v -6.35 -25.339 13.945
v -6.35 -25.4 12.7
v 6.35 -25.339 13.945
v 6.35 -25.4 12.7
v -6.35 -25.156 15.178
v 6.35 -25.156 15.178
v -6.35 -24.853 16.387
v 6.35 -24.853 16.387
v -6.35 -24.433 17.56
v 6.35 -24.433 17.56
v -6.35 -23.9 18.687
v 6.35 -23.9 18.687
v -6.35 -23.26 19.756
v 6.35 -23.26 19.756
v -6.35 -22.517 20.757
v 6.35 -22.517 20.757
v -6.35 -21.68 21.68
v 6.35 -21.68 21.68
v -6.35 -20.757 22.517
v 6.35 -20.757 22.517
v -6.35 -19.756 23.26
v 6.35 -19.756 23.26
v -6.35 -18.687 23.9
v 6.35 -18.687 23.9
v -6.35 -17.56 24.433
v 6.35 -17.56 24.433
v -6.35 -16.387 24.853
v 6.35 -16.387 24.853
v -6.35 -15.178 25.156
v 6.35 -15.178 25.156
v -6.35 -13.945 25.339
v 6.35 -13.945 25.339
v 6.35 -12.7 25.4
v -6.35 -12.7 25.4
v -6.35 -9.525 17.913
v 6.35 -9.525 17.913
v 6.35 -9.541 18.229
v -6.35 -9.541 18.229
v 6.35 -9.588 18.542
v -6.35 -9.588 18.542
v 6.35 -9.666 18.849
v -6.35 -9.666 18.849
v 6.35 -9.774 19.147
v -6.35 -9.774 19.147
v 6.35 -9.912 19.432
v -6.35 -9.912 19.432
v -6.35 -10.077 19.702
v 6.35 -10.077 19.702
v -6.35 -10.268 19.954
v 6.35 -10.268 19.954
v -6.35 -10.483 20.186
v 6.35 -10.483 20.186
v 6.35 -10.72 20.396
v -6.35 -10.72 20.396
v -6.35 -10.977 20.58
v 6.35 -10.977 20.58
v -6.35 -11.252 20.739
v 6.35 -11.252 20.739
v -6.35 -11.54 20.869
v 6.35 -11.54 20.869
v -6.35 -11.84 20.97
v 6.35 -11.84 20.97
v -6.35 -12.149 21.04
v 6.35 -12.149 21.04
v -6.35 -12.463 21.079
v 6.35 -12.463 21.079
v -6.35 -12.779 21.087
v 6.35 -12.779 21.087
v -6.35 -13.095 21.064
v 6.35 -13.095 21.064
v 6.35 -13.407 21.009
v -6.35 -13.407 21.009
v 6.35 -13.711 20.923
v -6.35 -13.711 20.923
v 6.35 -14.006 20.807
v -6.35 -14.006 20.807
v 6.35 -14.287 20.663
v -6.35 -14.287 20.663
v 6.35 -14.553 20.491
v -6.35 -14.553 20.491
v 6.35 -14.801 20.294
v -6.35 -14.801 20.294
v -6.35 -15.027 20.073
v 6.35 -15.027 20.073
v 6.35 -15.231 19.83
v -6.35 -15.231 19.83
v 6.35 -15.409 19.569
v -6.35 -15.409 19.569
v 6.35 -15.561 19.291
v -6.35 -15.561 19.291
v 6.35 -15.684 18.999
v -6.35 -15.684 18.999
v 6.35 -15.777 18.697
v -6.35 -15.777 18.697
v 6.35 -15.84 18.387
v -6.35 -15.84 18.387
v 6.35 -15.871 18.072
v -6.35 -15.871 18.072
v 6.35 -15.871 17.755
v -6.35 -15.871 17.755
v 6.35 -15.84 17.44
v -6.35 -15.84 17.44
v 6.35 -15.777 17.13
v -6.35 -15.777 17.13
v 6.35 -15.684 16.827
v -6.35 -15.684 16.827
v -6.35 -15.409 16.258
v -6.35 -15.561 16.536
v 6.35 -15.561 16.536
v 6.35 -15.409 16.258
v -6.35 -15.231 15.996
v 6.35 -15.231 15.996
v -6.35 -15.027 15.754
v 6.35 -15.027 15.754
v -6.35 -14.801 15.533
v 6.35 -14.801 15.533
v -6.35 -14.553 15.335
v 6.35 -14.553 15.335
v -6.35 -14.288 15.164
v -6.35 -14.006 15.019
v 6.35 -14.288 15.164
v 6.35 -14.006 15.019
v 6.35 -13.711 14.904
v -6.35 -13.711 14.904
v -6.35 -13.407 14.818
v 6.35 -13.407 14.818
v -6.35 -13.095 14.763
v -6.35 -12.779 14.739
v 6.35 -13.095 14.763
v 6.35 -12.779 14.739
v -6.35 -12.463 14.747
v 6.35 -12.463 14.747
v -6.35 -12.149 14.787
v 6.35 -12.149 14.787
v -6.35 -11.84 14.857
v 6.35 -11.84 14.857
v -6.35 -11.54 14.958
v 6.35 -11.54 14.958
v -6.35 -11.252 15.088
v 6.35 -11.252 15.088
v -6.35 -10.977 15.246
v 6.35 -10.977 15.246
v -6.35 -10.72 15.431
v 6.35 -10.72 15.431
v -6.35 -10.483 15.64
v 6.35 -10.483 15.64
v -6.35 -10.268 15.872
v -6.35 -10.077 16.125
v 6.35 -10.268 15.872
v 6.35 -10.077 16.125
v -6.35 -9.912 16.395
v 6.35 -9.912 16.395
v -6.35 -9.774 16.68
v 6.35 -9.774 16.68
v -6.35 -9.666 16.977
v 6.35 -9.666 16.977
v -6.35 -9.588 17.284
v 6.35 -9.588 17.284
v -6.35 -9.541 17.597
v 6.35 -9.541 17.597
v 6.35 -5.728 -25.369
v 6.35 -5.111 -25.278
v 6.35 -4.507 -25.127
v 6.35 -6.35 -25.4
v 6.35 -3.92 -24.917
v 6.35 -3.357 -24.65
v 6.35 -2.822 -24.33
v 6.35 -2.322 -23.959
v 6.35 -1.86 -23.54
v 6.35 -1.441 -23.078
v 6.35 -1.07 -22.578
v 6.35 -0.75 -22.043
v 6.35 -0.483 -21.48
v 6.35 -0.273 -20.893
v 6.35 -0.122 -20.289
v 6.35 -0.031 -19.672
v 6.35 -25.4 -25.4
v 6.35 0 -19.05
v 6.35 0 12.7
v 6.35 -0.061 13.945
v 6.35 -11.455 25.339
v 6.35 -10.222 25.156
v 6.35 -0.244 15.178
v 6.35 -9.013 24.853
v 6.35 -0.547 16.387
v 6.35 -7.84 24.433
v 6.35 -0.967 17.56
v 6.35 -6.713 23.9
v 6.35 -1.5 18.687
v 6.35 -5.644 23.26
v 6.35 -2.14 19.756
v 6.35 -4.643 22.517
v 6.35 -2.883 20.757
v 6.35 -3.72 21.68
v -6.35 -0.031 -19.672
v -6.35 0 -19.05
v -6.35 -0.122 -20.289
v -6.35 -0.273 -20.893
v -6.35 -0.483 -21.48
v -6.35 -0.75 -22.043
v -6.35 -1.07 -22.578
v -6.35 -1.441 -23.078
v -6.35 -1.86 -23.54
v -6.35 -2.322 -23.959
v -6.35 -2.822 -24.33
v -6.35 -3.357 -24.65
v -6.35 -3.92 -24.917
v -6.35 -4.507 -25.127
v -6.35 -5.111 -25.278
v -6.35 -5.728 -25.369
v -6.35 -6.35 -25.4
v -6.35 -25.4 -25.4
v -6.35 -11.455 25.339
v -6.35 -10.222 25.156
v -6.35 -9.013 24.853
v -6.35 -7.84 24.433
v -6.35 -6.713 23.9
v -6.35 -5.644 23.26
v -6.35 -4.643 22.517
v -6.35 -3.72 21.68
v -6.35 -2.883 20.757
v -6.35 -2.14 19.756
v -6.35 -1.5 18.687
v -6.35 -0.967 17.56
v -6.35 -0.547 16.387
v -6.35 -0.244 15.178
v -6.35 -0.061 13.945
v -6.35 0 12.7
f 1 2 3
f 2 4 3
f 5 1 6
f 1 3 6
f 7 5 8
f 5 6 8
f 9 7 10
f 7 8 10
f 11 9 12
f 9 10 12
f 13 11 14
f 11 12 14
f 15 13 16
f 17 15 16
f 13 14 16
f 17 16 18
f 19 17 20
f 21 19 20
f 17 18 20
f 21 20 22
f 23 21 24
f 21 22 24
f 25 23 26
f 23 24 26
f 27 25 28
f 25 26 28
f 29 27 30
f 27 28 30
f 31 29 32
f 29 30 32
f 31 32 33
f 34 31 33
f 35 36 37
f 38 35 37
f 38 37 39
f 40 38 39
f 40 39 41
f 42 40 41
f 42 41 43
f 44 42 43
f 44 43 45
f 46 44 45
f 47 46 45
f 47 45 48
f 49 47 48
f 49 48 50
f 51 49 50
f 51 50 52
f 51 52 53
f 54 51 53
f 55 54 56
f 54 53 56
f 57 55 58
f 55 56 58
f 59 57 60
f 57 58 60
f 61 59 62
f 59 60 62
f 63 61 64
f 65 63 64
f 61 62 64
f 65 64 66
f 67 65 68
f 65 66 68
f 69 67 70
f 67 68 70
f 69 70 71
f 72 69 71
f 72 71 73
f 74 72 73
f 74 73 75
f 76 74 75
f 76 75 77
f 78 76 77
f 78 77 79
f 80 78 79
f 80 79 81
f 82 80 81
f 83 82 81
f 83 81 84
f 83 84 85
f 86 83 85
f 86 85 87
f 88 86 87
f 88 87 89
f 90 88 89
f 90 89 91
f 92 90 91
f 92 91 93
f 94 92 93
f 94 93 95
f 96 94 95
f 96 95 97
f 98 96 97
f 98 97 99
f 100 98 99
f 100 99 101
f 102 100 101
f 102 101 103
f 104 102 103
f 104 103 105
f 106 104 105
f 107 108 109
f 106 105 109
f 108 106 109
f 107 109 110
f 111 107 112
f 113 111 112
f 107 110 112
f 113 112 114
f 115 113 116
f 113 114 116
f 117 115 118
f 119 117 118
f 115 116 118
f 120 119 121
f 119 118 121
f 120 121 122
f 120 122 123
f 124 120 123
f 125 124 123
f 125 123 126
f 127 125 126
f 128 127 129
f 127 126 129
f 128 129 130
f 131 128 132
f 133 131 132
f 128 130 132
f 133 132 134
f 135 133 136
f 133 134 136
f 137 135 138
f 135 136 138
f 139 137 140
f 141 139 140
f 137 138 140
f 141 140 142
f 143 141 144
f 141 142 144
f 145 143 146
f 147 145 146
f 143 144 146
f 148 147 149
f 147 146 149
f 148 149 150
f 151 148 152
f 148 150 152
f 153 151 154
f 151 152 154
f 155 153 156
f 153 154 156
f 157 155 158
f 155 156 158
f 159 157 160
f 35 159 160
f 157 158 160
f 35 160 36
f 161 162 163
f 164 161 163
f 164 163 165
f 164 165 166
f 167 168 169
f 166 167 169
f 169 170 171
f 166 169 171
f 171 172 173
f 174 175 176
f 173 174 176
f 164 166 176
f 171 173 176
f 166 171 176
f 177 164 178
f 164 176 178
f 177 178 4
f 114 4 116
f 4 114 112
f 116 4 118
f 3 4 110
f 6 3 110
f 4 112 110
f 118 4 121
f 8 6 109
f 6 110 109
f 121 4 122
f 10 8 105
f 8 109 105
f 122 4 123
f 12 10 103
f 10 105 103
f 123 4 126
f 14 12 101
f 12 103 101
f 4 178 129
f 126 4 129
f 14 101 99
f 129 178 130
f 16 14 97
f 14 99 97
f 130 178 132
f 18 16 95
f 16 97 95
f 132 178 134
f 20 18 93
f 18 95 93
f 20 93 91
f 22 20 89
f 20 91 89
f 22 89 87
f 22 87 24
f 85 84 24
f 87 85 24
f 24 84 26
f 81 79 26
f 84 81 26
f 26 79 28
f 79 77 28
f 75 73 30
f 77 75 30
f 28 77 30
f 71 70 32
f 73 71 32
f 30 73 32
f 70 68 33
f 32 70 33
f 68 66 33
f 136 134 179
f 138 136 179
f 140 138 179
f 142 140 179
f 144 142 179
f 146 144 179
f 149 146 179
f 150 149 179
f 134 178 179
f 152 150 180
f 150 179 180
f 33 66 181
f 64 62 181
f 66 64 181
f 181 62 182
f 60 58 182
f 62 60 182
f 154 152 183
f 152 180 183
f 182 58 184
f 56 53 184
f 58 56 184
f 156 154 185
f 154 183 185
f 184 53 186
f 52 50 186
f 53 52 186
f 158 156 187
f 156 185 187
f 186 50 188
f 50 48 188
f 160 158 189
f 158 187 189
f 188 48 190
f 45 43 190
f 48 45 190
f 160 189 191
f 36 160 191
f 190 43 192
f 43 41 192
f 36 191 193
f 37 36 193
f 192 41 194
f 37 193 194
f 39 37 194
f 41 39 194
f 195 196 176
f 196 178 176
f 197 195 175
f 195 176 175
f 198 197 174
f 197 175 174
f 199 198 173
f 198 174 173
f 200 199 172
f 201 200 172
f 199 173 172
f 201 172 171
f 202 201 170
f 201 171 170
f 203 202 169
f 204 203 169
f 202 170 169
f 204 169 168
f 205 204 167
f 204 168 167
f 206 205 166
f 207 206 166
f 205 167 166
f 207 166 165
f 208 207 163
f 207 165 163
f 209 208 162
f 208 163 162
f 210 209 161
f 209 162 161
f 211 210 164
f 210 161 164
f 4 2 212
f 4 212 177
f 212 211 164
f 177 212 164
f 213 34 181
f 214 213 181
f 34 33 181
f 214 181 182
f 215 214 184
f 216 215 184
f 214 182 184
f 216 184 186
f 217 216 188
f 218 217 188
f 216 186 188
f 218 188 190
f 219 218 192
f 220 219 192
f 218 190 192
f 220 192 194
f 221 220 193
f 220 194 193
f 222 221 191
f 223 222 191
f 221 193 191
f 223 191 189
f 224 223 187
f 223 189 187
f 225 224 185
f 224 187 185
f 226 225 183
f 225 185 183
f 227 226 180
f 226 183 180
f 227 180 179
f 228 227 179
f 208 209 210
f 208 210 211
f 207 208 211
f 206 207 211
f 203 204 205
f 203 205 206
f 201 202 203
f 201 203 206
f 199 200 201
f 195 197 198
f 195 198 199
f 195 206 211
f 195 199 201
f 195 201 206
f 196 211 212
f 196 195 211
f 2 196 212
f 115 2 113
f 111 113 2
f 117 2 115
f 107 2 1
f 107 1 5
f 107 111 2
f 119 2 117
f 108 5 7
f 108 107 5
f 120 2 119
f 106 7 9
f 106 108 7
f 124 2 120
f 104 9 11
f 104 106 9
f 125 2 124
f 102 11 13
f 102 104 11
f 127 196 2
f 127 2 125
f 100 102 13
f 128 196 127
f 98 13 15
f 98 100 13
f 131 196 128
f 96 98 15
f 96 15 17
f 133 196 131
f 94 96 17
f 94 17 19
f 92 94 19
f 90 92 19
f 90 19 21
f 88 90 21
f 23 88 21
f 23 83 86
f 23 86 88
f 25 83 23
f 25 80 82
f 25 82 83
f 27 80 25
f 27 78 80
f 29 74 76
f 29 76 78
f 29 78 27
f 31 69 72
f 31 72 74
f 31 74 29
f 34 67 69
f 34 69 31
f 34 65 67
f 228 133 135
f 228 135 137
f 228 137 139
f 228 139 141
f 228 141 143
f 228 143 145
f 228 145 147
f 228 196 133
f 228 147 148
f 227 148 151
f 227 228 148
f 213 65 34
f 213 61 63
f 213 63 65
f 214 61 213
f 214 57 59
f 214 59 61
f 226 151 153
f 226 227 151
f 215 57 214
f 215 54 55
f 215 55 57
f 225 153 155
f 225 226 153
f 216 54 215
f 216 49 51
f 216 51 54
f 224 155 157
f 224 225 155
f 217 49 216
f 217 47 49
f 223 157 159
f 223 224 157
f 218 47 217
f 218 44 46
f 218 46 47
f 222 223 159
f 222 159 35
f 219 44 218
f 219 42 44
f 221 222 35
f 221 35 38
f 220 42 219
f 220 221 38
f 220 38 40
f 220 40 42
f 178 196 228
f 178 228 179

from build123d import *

# Parameters (mm, degrees)
F0_W     = 12.7
F0_H     = 50.8
F1_DEPTH = 25.4
F2_R     = 3.175
F3_DEPTH = 25.4
F4_R     = 12.7
F5_R     = 12.69999
F6_R     = 6.35


# Not quite as in the source:
# - a fillet or chamfer is up to 0.001 mm smaller than in the source, because OpenCascade refuses the exact size


with BuildPart() as f1:
    # F0 (on Front) → F1 (new body)
    with BuildSketch(Plane.XZ):
        Rectangle(F0_W, F0_H)
    extrude(amount=F1_DEPTH)

    # F2 (on face) → F3 (cut)
    with BuildSketch(Plane.YZ.offset(6.35)):
        with Locations((-12.7, 17.9132968187)):
            Circle(F2_R)
    extrude(amount=-F3_DEPTH, mode=Mode.SUBTRACT)

    # F4
    f4_edges = [f1.edges().sort_by_distance(p)[0] for p in [
        (0, -25.4, 25.4),
    ]]
    fillet(f4_edges, radius=F4_R)

    # F5 (radius 12.7 in the source; OpenCascade refuses exactly that, so slightly less here)
    f5_edges = [f1.edges().sort_by_distance(p)[0] for p in [
        (0, 0, 25.4),
    ]]
    fillet(f5_edges, radius=F5_R)

    # F6
    f6_edges = [f1.edges().sort_by_distance(p)[0] for p in [
        (0, 0, -25.4),
    ]]
    fillet(f6_edges, radius=F6_R)


solid = f1.part
